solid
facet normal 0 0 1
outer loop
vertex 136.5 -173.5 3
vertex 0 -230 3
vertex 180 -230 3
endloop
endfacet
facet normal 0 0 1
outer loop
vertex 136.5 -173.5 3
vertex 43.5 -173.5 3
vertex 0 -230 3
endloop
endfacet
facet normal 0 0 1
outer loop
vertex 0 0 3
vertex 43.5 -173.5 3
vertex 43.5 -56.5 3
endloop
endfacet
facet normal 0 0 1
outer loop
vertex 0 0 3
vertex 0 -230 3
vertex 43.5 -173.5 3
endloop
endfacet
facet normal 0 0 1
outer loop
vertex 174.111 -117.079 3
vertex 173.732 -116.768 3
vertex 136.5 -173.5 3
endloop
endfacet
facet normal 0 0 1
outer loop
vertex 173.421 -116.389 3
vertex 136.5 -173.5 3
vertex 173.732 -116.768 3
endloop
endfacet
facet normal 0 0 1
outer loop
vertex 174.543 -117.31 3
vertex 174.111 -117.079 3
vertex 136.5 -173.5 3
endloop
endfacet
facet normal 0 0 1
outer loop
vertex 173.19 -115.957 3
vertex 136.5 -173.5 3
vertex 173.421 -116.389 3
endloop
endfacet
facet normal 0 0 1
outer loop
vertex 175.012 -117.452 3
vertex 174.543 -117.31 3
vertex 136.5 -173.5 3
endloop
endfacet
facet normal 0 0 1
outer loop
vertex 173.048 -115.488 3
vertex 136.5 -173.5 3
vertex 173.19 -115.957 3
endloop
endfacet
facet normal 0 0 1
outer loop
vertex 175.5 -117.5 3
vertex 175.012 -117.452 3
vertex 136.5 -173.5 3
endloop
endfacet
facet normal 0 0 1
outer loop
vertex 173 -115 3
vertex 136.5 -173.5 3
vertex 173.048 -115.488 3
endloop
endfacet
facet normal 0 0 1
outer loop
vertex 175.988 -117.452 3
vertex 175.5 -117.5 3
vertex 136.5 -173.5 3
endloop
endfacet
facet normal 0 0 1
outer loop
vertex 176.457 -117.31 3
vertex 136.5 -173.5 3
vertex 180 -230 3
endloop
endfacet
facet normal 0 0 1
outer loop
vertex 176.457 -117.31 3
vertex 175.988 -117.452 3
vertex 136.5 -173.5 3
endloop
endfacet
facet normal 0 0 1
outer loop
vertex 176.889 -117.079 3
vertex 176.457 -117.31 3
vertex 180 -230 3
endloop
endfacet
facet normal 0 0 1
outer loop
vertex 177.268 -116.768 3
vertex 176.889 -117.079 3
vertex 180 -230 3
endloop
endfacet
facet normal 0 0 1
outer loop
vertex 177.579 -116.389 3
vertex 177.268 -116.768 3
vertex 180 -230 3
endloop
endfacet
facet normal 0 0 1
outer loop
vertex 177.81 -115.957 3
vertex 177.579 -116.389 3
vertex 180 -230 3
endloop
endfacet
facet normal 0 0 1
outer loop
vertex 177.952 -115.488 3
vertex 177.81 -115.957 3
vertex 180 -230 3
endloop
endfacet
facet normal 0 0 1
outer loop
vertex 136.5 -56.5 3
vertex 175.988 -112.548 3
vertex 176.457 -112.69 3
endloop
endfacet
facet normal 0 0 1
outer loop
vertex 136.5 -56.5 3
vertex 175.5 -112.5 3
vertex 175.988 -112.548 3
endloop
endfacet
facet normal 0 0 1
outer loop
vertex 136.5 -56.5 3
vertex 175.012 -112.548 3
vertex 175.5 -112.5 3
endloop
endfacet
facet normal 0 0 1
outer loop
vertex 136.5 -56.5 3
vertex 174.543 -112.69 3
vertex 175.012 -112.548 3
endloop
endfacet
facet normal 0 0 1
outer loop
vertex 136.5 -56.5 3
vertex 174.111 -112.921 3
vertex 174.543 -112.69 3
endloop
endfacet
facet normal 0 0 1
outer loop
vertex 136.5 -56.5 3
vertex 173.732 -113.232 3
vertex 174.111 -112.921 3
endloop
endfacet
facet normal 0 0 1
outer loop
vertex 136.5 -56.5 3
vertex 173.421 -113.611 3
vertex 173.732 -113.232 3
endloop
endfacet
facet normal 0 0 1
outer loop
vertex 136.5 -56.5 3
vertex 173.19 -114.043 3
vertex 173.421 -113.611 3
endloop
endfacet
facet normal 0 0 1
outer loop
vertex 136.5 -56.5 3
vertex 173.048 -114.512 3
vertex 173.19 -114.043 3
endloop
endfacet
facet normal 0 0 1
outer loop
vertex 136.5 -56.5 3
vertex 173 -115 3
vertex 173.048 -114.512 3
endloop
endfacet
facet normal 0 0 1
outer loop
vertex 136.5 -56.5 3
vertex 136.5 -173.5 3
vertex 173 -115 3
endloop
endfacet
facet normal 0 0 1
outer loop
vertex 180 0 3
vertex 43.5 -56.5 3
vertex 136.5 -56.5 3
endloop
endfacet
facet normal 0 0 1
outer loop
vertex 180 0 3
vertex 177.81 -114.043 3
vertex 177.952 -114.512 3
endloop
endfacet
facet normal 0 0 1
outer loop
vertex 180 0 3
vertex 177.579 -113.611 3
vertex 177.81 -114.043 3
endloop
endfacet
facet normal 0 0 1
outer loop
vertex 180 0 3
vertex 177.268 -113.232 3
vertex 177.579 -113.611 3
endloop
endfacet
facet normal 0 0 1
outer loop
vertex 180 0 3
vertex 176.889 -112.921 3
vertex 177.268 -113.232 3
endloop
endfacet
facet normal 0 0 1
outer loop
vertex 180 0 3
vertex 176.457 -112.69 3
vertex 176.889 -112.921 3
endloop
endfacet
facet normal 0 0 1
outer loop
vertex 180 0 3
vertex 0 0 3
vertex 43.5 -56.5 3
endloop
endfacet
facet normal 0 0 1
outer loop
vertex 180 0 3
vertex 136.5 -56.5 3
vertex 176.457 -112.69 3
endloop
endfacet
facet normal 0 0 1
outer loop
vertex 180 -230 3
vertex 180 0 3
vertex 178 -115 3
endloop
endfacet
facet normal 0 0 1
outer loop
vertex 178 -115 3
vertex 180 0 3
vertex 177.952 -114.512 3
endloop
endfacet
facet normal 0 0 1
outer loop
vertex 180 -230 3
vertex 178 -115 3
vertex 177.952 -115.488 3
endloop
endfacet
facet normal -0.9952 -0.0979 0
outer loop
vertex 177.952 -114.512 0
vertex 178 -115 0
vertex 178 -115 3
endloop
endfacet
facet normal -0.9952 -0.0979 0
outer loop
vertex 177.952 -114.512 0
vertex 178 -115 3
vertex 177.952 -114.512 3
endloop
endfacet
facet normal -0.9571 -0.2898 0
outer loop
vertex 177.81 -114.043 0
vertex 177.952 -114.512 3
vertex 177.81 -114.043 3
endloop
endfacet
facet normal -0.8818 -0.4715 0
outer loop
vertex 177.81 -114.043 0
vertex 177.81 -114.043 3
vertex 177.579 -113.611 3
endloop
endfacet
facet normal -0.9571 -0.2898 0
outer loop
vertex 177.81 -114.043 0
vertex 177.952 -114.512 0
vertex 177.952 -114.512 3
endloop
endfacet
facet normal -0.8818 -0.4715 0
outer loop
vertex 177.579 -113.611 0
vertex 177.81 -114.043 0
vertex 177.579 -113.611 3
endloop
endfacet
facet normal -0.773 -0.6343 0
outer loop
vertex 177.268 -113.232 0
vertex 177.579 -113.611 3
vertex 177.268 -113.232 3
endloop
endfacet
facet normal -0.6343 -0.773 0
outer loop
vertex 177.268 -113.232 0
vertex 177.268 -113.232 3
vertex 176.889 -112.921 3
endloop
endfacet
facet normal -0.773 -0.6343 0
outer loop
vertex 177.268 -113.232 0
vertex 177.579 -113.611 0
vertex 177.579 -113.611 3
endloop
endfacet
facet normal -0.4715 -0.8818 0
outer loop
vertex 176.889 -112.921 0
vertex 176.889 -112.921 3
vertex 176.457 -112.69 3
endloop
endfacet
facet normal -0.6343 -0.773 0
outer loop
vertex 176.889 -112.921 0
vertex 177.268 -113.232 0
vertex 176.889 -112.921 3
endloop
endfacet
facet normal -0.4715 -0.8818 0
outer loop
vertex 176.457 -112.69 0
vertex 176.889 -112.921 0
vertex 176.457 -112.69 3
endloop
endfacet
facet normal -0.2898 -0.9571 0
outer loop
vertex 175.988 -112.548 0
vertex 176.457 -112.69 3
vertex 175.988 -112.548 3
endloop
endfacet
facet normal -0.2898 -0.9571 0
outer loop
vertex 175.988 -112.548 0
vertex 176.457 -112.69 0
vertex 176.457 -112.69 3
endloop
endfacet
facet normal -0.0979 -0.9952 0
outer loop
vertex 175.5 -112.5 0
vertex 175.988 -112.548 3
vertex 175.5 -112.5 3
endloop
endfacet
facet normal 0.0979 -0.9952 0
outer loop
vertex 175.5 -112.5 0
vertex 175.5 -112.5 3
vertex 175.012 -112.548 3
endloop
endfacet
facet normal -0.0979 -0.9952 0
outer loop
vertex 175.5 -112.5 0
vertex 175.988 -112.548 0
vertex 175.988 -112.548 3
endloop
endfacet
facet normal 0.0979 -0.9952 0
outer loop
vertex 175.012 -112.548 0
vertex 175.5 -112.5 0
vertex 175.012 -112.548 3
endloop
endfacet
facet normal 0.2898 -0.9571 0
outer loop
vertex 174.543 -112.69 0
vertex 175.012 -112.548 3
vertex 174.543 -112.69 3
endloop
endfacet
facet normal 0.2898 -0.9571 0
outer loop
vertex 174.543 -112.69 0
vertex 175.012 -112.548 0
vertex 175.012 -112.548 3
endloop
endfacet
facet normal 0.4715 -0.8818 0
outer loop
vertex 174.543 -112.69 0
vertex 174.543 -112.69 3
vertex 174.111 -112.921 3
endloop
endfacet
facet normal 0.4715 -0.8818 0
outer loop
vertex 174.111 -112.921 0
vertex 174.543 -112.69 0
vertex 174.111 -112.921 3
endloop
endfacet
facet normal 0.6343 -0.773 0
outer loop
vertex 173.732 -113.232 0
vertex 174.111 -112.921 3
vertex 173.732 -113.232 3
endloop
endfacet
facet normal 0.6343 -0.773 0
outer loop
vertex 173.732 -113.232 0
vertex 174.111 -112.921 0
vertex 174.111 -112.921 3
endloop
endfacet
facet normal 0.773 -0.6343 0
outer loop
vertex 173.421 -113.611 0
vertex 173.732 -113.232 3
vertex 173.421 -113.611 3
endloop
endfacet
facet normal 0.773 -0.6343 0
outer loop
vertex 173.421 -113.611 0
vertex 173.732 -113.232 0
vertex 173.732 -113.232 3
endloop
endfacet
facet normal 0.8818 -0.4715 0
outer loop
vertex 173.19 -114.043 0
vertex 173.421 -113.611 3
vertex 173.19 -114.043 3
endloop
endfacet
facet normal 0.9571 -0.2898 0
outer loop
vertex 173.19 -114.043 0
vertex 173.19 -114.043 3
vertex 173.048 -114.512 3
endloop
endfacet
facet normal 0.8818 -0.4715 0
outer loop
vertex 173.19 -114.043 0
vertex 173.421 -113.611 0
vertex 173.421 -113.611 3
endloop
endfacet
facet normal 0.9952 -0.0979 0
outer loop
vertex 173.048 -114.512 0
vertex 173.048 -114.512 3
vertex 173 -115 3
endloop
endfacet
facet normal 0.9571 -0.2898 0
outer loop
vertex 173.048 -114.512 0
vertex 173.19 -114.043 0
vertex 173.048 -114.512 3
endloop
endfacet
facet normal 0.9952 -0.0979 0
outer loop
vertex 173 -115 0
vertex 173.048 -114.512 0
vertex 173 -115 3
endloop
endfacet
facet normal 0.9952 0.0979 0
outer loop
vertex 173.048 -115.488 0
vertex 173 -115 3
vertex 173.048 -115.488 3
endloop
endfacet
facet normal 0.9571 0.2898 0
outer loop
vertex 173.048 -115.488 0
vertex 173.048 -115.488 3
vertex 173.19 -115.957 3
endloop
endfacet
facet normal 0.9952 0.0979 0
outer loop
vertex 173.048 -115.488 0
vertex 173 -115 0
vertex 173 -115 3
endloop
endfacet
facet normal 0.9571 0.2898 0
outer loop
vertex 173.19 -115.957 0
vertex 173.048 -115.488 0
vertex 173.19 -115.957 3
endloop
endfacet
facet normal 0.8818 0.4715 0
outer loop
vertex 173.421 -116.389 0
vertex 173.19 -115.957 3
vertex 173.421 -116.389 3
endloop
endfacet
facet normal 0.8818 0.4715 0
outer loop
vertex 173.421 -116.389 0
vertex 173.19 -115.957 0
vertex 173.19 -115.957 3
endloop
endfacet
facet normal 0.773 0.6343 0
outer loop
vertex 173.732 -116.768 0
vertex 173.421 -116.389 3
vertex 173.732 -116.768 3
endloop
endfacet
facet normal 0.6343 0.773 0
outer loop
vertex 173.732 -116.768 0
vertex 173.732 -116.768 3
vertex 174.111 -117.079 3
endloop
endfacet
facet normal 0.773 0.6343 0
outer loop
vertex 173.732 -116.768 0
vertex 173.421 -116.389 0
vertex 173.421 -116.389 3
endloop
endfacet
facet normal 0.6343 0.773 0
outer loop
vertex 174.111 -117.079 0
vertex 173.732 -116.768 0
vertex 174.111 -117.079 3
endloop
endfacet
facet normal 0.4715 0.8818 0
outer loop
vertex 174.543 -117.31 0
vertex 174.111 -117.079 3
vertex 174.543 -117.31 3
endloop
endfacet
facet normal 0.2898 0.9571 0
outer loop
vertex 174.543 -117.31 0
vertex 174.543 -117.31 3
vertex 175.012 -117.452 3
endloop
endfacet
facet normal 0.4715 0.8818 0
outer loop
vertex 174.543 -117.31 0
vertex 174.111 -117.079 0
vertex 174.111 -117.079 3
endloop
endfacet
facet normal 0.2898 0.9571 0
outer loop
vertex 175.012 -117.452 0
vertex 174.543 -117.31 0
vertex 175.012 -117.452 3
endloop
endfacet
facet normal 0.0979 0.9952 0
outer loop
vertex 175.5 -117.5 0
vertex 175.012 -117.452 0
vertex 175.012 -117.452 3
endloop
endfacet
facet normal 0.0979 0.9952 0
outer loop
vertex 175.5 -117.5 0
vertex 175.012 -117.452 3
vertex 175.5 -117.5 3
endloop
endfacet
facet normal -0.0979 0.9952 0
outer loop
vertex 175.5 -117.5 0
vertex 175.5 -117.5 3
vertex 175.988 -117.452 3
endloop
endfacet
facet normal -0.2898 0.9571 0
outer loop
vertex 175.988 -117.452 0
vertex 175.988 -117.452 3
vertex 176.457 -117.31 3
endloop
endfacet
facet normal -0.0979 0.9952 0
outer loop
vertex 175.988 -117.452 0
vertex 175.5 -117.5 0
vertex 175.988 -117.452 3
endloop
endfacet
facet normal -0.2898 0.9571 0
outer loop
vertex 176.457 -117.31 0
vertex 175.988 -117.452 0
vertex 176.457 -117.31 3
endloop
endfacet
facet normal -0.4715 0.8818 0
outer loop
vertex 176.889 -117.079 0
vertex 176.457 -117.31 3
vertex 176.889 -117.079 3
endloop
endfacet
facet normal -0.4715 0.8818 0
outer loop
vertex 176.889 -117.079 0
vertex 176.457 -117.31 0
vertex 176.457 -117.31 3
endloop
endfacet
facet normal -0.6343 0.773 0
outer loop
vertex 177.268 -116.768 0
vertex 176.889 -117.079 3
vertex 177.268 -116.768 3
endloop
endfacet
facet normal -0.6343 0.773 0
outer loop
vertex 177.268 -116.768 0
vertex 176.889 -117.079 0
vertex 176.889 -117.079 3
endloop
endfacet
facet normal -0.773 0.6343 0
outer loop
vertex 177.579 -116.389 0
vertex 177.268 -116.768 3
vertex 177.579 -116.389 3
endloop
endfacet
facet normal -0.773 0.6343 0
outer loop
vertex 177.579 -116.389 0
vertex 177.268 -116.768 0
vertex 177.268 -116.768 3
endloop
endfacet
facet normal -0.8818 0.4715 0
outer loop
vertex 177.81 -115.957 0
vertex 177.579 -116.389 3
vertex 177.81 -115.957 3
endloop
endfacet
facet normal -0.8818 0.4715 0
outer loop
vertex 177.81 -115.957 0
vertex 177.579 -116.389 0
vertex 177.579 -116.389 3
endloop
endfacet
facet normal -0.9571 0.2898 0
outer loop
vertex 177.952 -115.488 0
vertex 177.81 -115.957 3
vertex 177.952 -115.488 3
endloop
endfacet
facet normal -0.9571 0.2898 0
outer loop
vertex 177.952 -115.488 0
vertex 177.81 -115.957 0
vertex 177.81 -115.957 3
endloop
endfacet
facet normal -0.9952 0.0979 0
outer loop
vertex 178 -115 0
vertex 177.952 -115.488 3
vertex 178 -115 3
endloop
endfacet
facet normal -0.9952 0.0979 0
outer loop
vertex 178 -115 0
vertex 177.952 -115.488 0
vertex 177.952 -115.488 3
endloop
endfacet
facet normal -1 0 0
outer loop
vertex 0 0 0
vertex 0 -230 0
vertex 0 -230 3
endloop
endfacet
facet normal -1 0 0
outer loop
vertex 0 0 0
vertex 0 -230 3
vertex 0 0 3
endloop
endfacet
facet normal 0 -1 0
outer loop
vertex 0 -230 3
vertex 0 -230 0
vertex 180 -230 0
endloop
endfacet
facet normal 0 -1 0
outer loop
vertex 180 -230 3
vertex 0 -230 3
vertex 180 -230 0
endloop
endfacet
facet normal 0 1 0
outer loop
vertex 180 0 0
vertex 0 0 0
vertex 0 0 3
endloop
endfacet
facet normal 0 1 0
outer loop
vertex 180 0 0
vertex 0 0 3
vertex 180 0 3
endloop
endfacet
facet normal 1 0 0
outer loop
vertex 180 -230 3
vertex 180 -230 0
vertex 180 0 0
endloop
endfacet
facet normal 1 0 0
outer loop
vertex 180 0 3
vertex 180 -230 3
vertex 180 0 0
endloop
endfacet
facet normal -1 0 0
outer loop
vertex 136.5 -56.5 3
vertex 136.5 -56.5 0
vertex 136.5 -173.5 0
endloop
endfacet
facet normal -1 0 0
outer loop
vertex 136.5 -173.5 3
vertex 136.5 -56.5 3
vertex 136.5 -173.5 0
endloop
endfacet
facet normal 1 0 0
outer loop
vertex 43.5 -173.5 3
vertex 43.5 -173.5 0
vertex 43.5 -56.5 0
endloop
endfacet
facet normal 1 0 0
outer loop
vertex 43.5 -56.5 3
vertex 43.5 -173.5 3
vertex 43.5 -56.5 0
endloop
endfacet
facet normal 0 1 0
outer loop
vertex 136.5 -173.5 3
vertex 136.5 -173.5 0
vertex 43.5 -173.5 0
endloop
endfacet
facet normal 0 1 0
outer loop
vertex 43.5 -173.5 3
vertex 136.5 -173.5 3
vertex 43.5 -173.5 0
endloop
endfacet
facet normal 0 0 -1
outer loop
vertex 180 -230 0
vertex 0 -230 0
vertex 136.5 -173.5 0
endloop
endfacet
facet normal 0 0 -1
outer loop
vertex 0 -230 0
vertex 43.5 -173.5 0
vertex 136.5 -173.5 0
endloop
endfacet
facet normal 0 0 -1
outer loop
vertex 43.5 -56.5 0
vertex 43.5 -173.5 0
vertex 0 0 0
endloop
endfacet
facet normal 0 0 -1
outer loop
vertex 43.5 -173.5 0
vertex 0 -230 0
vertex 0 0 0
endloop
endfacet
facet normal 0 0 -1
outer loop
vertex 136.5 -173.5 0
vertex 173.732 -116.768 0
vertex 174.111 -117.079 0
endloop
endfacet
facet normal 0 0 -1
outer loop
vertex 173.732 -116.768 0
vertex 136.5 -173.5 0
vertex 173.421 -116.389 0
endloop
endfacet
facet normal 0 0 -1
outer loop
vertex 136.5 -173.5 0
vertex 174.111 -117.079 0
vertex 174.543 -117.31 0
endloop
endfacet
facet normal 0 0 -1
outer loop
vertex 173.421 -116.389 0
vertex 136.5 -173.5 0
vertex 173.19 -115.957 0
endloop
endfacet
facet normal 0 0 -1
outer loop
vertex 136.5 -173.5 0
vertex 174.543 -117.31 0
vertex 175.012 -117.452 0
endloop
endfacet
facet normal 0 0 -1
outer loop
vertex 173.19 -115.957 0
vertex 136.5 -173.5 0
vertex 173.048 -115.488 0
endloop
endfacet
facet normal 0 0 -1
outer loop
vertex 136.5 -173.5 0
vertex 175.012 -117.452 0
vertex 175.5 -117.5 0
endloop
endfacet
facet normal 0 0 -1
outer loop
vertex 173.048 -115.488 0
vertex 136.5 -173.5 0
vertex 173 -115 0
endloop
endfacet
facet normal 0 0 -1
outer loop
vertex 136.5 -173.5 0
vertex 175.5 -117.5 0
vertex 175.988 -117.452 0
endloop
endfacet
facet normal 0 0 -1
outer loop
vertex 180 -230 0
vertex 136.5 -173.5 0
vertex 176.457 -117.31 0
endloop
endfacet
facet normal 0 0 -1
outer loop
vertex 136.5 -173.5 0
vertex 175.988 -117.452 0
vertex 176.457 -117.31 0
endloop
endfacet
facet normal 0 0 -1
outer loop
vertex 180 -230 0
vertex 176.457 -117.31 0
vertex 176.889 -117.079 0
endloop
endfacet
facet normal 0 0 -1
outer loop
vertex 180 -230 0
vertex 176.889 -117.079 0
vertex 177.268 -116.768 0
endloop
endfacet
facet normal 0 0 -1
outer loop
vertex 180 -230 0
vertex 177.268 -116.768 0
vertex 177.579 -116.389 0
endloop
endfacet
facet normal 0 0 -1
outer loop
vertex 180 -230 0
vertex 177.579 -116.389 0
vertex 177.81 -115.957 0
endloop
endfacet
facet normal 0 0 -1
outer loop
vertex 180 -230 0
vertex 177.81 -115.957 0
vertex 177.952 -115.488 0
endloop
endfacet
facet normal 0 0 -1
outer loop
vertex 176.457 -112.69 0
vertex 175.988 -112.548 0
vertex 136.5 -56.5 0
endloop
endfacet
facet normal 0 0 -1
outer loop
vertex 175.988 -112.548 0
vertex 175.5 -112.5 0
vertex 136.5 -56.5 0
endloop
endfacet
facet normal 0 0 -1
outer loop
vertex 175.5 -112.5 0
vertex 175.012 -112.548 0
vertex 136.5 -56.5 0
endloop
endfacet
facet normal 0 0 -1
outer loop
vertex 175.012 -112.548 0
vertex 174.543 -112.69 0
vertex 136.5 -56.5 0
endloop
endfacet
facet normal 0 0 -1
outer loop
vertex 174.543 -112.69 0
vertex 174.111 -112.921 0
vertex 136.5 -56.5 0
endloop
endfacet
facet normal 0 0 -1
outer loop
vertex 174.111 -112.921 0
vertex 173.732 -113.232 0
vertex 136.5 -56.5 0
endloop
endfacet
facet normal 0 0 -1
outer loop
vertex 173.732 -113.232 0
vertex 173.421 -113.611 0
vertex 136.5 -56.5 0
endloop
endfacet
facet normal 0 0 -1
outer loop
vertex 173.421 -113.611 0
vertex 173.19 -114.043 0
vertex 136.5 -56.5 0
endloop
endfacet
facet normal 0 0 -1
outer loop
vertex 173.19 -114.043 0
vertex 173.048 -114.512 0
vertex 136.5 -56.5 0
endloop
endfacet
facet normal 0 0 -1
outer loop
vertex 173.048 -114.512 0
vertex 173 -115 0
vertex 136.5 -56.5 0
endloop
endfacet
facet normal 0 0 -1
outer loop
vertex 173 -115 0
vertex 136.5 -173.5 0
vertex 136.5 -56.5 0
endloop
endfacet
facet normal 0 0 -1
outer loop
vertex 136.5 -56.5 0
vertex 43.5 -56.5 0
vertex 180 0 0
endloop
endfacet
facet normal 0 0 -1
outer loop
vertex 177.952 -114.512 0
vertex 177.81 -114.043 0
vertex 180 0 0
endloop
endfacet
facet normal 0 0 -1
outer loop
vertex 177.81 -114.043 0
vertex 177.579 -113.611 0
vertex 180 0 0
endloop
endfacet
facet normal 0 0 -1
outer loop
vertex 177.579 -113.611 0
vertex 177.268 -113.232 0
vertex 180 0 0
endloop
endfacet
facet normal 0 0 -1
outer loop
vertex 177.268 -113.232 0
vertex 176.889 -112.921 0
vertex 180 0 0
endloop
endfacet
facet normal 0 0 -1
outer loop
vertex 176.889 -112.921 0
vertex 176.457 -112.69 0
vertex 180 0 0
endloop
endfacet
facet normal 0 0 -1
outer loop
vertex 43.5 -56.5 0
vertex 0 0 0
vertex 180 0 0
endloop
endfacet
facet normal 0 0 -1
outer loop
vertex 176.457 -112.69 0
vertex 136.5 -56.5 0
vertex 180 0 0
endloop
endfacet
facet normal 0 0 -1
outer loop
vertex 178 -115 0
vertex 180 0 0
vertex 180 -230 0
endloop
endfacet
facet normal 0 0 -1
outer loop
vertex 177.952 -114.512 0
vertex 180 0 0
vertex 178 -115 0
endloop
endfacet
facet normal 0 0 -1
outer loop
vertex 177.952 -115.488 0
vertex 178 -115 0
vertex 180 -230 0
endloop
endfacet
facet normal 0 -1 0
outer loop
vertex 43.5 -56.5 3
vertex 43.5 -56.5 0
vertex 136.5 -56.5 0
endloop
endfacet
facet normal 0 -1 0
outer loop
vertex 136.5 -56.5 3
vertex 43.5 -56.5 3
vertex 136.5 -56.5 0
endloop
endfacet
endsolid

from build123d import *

# Parameters (mm, degrees)
CROQUIS1_W              = 180
CROQUIS1_H              = 230
CROQUIS1_R              = 2.5
SALIENTE_EXTRUIR1_DEPTH = 3


with BuildPart() as part:
    # Croquis1 → Saliente-Extruir1 (new body)
    with BuildSketch(Plane.XY):
        with Locations((90, -115)):
            Rectangle(CROQUIS1_W, CROQUIS1_H)
        with Locations((175.5, -115)):
            Circle(CROQUIS1_R, mode=Mode.SUBTRACT)
        Polygon((90, -56.5), (136.5, -56.5), (136.5, -173.5), (43.5, -173.5), (43.5, -56.5), align=None, mode=Mode.SUBTRACT)
    extrude(amount=SALIENTE_EXTRUIR1_DEPTH)


solid = part.part
